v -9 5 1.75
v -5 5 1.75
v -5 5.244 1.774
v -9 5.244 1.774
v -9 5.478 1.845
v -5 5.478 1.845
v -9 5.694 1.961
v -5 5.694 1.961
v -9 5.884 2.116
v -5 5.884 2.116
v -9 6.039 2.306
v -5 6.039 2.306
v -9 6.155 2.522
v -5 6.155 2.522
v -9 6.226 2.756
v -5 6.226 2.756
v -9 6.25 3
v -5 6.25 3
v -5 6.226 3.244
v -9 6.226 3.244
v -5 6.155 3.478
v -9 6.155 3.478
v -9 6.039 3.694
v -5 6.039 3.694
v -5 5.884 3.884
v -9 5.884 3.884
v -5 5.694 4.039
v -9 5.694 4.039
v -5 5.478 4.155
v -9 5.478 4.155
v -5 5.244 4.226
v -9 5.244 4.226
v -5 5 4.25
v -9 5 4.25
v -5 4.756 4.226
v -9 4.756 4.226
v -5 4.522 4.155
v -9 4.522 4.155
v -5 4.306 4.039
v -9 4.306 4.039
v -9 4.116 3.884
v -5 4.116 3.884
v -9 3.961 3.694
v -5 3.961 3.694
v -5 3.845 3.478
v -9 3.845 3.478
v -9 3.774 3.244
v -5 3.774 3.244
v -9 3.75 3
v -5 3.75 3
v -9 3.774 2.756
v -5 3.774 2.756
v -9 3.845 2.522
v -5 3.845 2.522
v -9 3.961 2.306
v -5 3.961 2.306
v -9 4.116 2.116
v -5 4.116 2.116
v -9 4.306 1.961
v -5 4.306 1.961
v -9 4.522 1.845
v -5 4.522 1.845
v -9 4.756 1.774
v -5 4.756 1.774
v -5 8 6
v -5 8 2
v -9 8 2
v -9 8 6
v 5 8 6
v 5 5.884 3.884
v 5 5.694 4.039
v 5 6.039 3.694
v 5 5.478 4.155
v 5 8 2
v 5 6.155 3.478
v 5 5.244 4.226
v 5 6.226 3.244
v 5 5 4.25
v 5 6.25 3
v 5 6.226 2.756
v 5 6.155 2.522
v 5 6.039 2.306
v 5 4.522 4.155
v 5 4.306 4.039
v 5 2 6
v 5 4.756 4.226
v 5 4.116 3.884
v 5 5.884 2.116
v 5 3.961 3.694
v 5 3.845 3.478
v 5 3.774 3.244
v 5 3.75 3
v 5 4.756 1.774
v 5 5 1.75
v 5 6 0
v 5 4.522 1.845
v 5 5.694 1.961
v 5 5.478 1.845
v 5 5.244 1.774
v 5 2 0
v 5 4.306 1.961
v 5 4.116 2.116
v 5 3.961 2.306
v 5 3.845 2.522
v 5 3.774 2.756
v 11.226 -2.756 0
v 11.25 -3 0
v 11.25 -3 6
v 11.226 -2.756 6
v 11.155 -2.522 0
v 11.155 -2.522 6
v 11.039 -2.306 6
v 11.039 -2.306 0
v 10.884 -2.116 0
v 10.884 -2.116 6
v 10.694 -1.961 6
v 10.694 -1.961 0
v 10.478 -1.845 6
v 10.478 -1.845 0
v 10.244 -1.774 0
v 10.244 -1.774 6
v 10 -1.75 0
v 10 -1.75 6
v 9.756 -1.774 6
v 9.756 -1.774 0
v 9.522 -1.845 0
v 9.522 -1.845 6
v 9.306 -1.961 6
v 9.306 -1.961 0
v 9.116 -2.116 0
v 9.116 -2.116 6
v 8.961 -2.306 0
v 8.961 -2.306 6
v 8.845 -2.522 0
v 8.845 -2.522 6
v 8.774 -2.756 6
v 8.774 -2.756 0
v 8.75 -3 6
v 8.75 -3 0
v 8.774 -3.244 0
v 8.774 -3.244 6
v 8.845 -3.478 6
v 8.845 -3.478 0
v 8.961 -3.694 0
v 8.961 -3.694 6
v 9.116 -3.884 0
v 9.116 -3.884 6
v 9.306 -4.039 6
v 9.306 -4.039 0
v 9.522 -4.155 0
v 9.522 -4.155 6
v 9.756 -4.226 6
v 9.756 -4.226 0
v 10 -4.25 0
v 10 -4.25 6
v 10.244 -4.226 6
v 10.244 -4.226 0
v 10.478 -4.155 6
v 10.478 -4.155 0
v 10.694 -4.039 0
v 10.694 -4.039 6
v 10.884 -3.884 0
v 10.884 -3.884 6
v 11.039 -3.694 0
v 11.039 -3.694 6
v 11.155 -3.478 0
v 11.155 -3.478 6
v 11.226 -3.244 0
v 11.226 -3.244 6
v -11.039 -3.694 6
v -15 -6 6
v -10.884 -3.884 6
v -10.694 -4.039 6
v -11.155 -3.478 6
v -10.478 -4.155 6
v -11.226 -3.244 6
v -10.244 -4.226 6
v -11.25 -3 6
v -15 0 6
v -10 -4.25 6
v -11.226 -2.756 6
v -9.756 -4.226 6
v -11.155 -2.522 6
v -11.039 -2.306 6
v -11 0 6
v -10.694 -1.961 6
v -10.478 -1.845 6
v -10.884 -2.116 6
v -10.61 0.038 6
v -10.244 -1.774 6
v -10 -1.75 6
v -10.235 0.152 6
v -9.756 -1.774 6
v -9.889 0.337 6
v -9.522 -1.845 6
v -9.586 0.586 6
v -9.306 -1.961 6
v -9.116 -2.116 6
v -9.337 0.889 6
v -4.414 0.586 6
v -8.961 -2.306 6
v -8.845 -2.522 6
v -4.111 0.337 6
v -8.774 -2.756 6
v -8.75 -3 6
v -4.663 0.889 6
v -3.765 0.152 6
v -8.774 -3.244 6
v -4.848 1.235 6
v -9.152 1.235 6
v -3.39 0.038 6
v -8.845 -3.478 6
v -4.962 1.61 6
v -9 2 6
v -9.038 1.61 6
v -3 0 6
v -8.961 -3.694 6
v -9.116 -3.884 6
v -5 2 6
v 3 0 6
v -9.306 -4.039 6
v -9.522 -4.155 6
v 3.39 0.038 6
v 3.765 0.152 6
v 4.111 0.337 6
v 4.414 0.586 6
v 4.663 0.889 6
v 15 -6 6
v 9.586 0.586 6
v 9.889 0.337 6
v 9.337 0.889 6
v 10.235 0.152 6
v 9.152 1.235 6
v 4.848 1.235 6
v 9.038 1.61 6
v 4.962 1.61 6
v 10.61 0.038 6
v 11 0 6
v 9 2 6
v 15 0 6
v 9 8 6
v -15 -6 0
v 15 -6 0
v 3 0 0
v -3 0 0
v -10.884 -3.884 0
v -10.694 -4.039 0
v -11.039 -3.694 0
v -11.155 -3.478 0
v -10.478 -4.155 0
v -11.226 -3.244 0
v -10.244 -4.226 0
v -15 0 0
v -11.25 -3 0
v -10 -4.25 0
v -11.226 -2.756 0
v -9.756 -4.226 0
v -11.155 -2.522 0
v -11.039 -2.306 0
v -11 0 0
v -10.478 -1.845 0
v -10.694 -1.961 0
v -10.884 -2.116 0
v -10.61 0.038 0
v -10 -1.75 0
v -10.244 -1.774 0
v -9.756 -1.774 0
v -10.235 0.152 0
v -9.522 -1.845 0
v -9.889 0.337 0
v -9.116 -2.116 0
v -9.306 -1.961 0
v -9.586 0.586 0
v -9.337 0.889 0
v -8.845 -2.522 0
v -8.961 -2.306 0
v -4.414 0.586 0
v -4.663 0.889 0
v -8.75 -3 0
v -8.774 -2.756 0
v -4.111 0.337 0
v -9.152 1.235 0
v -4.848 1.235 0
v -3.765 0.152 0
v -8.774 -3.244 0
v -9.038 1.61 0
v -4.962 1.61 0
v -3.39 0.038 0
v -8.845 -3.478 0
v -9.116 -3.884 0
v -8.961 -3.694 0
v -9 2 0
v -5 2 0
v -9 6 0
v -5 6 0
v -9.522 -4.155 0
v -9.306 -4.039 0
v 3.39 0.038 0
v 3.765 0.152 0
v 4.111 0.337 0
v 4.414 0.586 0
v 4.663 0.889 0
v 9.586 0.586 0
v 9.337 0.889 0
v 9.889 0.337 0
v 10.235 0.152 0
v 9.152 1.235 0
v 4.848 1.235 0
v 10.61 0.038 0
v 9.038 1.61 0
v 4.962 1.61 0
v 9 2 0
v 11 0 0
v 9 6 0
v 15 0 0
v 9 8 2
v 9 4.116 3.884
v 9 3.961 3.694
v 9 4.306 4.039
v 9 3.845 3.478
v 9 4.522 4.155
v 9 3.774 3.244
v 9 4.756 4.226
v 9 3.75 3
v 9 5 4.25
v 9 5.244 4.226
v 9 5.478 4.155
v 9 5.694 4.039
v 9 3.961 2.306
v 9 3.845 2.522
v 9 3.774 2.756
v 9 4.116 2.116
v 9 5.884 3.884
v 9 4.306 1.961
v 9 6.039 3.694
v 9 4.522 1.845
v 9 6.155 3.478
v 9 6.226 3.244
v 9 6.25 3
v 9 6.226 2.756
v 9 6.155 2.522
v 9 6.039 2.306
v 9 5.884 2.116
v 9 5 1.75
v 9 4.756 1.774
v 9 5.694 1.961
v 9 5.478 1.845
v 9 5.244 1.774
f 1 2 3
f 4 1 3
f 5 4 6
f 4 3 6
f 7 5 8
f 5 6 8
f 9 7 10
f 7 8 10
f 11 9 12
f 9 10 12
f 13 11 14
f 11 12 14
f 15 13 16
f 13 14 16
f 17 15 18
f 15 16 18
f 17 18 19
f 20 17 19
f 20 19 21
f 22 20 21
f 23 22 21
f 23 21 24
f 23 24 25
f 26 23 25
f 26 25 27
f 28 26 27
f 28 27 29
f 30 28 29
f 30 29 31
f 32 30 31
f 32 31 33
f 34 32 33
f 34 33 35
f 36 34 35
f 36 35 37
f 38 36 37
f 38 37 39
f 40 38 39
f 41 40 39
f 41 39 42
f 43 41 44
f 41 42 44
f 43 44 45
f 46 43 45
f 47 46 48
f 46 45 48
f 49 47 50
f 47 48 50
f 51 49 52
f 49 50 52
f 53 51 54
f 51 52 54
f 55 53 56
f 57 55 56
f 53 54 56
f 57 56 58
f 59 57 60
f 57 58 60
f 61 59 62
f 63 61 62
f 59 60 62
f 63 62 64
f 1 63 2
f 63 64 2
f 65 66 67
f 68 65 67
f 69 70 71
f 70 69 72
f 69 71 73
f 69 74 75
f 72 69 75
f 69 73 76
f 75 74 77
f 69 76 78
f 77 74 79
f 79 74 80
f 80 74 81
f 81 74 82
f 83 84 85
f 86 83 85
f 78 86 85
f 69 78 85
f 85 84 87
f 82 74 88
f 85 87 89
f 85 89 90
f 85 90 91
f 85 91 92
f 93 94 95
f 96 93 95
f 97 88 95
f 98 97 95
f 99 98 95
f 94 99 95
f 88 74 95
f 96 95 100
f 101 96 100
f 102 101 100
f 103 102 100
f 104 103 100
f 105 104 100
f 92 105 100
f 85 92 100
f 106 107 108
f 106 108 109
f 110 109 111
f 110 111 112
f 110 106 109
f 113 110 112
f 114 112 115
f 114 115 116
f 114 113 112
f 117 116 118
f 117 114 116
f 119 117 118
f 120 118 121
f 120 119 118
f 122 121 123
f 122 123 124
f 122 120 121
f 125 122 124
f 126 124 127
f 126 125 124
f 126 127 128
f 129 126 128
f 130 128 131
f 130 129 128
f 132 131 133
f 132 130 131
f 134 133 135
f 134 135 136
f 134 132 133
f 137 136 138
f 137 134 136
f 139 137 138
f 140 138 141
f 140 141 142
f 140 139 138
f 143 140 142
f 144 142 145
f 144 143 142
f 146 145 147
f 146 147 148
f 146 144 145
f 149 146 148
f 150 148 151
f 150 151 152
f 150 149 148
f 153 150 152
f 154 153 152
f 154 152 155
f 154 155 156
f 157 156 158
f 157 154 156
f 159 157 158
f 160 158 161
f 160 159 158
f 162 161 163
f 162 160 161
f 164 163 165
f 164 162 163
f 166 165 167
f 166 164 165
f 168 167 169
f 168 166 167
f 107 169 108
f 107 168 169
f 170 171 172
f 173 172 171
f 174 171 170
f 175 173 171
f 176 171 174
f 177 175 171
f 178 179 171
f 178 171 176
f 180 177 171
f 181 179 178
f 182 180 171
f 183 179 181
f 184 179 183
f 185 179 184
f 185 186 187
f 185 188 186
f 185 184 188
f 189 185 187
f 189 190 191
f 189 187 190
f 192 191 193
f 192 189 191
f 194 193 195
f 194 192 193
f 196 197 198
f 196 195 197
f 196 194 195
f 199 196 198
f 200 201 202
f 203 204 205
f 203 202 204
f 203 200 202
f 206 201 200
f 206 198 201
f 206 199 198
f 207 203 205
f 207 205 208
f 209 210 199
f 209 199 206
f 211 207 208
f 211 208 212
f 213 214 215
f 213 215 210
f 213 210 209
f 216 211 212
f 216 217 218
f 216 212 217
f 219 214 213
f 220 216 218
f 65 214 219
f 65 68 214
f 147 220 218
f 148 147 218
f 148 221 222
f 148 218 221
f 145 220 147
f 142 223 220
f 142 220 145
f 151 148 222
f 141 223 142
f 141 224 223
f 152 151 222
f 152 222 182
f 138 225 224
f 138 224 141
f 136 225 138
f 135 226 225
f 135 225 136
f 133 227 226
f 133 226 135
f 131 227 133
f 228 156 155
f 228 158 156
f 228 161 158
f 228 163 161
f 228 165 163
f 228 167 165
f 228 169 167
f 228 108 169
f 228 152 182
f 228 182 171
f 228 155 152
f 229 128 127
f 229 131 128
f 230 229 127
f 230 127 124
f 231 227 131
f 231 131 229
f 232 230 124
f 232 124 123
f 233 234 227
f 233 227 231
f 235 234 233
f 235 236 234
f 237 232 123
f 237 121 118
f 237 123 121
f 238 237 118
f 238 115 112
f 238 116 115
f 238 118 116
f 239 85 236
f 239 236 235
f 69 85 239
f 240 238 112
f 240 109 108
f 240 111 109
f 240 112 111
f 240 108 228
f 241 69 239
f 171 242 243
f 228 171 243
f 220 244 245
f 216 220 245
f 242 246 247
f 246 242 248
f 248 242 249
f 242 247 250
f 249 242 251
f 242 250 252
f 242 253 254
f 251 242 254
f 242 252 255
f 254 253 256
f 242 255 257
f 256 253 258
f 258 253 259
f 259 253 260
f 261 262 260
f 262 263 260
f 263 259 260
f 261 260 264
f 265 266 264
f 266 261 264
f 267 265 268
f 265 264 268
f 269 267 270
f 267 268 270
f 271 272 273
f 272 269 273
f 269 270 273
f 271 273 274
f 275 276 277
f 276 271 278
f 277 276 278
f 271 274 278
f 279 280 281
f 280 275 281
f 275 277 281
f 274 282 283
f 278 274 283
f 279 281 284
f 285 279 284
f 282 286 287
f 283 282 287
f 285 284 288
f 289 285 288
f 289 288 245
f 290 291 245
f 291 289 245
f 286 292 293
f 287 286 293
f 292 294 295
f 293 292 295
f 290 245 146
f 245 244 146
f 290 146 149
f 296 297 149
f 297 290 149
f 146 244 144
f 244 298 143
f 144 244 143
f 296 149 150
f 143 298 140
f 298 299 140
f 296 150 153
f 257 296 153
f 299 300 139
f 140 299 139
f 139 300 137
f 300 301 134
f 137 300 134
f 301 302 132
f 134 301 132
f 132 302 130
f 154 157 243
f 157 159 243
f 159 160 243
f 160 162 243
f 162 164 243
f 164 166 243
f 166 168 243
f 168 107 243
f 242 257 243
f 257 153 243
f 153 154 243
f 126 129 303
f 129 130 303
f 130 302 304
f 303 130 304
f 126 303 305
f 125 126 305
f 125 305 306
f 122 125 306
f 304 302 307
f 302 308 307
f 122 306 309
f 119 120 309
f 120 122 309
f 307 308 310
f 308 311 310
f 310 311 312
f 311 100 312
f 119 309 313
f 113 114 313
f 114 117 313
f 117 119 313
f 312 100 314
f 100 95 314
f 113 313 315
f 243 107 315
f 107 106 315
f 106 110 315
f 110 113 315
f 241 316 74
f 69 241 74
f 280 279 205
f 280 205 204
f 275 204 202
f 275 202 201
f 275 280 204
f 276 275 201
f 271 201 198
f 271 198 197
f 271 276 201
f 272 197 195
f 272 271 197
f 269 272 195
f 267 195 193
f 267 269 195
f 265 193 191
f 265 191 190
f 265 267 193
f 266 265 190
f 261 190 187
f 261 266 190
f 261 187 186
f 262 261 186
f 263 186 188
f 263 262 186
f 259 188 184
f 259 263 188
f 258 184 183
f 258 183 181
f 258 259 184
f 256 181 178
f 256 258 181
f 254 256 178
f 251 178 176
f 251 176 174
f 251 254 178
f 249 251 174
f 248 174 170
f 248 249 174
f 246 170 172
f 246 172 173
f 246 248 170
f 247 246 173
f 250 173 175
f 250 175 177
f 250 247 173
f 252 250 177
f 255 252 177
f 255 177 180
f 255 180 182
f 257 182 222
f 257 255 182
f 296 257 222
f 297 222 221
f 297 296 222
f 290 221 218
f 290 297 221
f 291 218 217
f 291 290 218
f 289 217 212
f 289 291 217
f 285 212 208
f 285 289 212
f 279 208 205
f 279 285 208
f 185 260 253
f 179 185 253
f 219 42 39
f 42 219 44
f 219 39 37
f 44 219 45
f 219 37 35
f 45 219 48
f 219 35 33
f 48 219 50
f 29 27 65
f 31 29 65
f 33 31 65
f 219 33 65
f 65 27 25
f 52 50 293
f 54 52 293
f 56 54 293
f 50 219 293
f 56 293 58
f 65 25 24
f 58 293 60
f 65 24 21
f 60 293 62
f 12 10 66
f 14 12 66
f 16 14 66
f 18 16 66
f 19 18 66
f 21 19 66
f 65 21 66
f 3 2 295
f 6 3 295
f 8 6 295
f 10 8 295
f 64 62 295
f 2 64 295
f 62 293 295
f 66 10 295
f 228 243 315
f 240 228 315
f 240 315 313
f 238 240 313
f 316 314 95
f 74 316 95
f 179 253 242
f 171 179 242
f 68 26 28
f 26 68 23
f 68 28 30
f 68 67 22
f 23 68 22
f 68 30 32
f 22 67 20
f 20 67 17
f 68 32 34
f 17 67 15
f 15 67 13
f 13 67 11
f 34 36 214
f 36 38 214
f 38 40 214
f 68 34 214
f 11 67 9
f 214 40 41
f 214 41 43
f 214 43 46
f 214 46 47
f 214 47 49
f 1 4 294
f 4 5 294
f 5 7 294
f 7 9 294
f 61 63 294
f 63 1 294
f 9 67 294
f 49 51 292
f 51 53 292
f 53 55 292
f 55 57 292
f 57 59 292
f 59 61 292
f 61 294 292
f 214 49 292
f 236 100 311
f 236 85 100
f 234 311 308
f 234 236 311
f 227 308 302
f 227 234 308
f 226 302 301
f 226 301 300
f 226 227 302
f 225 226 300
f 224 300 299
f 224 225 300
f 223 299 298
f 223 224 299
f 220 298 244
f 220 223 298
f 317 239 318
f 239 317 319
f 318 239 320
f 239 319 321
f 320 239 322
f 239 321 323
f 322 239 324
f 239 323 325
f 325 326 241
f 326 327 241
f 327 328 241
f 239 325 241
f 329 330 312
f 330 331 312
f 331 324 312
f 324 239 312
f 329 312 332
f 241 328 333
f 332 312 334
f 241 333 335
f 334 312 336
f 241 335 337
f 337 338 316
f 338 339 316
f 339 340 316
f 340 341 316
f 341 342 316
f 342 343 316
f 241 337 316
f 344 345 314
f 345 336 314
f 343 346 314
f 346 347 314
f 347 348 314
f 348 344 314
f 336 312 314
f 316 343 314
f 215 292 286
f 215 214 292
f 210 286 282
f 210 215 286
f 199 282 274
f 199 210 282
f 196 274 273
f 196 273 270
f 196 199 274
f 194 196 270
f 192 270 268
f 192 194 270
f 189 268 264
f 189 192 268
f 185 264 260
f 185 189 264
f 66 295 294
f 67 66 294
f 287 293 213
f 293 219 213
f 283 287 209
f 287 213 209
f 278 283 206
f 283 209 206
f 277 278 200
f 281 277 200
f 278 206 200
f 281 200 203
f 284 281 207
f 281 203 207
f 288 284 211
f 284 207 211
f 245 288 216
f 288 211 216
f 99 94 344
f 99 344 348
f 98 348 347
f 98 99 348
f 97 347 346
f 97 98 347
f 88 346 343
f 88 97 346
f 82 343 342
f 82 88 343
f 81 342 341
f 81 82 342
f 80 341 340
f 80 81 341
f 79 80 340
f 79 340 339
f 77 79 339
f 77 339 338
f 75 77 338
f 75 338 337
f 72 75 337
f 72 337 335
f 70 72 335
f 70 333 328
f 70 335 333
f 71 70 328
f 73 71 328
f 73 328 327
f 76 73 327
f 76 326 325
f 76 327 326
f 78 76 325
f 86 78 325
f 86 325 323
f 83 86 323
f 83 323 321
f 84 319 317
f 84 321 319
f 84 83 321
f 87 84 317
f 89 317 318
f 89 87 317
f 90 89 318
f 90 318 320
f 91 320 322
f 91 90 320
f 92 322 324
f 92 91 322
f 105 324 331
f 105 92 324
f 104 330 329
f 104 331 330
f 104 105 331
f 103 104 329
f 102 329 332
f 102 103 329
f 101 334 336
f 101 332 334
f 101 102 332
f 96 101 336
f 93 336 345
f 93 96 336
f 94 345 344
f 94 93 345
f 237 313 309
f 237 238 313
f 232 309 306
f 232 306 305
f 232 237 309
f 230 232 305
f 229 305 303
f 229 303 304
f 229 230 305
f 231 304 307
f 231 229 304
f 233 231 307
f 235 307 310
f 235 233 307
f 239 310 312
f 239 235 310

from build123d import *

# Parameters (mm, degrees)
SKETCH_1_R               = 1.25
EXTRUDE_1_DEPTH          = 6
CHAMFER_1_SIZE           = 2
SKETCH_2_R               = 1.25
CUT_EXTRUDE_1_DEPTH      = 16
CUT_EXTRUDE_1_DEPTH_BACK = 16
FILLET_1_R               = 2


with BuildPart() as part:
    # 草图1 → 凸台-拉伸1 (new body)
    with BuildSketch(Plane.XY):
        Polygon((-15, -6), (15, -6), (15, 0), (9, 0), (9, 8), (5, 8), (5, 0), (-5, 0), (-5, 8), (-9, 8), (-9, 0), (-15, 0), align=None)
        with Locations((-10, -3)):
            Circle(SKETCH_1_R, mode=Mode.SUBTRACT)
        with Locations((10, -3)):
            Circle(SKETCH_1_R, mode=Mode.SUBTRACT)
    extrude(amount=EXTRUDE_1_DEPTH)

    # 倒角1
    chamfer_1_edges = [part.edges().sort_by_distance(p)[0] for p in [
        (-7, 8, 0),
        (7, 8, 0),
    ]]
    chamfer(chamfer_1_edges, length=CHAMFER_1_SIZE)

    # 草图2 → 切除-拉伸1 (cut, two sides)
    with BuildSketch(Plane(origin=(0, 0, 0), x_dir=(0, 0, -1), z_dir=(1, 0, 0))) as cut_extrude_1_sk:
        with Locations((-3, 5)):
            Circle(SKETCH_2_R)
    extrude(amount=CUT_EXTRUDE_1_DEPTH, mode=Mode.SUBTRACT)
    extrude(cut_extrude_1_sk.sketch, amount=-CUT_EXTRUDE_1_DEPTH_BACK, mode=Mode.SUBTRACT)

    # 圆角1
    fillet_1_edges = [part.edges().sort_by_distance(p)[0] for p in [
        (-9, 0, 3),
        (-5, 0, 3),
        (5, 0, 3),
        (9, 0, 3),
    ]]
    fillet(fillet_1_edges, radius=FILLET_1_R)


solid = part.part
